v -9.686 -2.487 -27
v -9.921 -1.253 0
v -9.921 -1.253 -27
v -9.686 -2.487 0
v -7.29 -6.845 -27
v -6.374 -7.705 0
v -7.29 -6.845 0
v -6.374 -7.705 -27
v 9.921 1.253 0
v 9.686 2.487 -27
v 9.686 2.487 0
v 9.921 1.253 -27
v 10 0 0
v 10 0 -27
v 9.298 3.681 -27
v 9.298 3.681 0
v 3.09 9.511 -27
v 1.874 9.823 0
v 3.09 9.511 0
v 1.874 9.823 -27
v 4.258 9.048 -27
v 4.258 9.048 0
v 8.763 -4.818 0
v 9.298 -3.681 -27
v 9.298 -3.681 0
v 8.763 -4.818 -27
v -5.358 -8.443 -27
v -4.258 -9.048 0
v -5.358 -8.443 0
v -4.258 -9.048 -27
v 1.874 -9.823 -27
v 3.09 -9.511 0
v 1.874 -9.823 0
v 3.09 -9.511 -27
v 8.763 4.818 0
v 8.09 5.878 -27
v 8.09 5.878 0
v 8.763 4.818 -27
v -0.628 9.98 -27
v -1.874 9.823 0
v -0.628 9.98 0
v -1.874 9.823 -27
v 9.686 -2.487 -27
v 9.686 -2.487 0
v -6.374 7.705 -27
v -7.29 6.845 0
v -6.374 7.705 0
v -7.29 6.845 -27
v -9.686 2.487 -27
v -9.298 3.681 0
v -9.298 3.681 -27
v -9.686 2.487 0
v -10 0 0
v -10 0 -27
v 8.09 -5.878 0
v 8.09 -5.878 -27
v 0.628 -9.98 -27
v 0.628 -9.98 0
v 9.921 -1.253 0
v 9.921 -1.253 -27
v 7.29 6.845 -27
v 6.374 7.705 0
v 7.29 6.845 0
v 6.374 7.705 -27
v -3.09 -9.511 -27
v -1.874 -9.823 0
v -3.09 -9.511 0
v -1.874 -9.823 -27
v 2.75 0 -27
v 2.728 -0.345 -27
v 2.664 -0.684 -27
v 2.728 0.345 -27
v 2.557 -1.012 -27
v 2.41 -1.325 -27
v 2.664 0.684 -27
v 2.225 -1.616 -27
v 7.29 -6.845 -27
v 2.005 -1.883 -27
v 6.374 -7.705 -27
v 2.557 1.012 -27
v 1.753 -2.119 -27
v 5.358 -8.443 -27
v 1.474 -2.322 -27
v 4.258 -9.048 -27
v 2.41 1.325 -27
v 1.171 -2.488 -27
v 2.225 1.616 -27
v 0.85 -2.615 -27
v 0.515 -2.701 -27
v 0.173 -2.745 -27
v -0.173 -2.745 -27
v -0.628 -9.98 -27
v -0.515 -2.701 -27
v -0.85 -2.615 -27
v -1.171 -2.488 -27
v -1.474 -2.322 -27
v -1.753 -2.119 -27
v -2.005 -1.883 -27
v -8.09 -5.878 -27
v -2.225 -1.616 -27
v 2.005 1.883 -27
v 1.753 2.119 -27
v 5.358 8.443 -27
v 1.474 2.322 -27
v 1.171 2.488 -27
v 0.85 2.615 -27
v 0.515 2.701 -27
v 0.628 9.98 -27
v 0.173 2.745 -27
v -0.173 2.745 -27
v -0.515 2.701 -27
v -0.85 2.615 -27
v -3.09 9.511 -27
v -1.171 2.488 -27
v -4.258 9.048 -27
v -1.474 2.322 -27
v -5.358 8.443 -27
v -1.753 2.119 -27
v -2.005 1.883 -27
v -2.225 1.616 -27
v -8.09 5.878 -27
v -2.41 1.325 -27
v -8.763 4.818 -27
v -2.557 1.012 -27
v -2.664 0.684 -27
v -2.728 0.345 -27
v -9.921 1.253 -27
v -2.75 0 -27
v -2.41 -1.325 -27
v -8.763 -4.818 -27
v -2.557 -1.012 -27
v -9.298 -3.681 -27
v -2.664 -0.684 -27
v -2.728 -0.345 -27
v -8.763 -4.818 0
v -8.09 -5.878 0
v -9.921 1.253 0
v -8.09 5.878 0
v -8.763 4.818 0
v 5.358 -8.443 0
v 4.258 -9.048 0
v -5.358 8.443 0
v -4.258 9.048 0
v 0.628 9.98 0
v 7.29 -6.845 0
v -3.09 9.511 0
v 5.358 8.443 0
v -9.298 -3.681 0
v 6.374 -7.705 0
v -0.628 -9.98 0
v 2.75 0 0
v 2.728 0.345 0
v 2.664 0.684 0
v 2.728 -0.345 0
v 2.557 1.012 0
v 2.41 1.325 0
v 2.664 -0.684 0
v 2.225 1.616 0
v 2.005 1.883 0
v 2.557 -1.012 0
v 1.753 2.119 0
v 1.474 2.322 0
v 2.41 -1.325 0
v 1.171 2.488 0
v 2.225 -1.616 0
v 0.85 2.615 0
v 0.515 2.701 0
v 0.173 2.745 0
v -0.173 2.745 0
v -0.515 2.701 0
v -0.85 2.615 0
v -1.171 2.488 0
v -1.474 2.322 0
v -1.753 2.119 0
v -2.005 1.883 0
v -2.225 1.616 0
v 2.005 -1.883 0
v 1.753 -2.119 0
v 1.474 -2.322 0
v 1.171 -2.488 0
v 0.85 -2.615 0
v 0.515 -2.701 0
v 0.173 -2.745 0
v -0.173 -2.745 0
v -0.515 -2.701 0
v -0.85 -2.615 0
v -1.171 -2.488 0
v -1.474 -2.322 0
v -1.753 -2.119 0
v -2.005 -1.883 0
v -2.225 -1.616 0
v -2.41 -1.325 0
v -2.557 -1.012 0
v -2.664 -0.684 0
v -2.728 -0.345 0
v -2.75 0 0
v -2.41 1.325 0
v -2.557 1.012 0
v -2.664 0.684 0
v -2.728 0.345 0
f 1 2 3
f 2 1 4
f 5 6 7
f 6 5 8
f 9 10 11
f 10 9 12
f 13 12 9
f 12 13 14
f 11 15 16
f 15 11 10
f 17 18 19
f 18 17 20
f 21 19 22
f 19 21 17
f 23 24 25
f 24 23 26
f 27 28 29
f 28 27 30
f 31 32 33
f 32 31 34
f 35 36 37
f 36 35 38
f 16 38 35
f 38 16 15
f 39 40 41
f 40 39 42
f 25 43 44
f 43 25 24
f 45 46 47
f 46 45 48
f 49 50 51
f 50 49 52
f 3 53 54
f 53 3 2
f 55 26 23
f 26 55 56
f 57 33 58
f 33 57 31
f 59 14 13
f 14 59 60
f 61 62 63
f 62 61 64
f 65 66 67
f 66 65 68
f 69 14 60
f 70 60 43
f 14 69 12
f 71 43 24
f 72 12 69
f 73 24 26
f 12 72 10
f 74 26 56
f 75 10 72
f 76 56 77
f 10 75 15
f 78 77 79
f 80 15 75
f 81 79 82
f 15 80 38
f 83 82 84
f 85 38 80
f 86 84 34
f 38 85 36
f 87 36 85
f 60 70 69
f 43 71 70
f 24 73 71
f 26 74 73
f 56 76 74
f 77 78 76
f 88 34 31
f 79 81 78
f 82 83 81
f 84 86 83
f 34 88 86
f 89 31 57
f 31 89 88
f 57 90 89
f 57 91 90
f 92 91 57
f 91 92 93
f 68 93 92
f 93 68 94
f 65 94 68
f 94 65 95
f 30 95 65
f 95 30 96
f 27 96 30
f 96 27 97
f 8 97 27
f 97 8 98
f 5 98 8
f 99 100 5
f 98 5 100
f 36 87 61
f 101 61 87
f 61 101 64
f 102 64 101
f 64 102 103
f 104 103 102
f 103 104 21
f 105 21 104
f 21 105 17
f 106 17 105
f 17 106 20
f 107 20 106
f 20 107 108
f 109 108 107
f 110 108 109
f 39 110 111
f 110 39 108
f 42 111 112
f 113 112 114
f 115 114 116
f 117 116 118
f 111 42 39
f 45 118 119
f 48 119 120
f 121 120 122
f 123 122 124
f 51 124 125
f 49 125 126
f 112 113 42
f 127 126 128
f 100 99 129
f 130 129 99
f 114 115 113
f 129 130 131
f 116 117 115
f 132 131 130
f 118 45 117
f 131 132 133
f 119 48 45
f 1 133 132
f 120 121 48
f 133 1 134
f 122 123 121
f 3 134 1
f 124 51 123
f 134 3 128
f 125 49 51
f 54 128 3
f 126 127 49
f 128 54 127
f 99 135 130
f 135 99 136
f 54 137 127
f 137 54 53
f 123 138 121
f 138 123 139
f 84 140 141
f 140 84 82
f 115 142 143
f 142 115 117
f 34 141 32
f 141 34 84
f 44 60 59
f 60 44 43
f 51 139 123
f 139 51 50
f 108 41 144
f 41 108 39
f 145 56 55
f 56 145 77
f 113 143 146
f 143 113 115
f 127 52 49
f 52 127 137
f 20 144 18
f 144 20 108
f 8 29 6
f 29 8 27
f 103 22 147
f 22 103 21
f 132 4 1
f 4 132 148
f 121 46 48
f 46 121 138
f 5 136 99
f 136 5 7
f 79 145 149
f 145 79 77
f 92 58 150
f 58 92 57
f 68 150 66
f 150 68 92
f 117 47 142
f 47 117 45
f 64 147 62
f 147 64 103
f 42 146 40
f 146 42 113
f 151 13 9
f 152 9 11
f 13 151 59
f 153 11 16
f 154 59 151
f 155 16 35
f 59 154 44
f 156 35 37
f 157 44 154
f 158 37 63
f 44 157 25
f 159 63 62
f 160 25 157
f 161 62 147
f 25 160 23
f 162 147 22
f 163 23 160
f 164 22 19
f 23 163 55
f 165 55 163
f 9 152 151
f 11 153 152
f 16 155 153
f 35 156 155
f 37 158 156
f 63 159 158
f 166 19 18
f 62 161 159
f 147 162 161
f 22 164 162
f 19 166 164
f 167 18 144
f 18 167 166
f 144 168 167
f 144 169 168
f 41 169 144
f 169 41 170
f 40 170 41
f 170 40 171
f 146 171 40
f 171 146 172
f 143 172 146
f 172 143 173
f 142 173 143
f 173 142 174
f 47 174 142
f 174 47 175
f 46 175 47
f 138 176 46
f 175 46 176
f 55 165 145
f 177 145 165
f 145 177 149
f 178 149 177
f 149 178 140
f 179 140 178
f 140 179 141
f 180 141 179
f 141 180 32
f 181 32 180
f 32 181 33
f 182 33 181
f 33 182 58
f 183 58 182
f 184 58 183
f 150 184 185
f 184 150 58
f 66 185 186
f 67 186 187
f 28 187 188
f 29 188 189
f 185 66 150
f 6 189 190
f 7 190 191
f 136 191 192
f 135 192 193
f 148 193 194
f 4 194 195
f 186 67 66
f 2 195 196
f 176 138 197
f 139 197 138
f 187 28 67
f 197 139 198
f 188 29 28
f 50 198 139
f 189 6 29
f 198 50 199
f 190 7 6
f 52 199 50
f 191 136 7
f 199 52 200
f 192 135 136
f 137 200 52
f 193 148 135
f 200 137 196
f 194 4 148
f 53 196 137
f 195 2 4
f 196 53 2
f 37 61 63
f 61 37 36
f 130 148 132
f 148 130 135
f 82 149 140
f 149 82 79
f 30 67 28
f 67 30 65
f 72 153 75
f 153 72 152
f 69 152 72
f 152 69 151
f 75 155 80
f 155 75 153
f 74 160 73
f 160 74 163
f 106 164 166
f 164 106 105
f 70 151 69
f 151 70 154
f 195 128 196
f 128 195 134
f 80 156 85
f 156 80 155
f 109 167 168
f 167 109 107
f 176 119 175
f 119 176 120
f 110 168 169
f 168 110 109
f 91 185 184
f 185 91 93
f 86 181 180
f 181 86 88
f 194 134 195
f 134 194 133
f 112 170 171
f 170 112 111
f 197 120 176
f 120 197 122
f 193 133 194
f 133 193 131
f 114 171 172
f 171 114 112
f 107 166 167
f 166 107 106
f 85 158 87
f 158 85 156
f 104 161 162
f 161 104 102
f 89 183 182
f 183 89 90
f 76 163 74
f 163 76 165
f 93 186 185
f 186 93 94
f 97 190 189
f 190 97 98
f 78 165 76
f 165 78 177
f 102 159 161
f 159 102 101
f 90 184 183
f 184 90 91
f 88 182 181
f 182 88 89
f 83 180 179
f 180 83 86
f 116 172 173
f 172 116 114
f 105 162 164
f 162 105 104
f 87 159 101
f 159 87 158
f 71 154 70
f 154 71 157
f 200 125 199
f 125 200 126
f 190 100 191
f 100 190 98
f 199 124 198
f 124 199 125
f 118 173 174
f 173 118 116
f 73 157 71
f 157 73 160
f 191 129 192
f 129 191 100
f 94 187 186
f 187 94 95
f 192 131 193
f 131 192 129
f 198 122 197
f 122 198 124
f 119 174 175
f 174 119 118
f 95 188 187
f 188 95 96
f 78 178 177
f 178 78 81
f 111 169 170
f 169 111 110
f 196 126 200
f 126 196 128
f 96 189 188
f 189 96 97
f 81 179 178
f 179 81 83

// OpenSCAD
$fn = 50;


difference() {
	union() {
		translate(v = [0, 0, -27.0000000000]) {
			cylinder(h = 27, r = 10.0000000000);
		}
		cylinder(h = 0, r = 13.0000000000);
	}
	union() {
		#translate(v = [0, 0, -27]) {
			cylinder(h = 27, r = 2.7500000000);
		}
	}
}
